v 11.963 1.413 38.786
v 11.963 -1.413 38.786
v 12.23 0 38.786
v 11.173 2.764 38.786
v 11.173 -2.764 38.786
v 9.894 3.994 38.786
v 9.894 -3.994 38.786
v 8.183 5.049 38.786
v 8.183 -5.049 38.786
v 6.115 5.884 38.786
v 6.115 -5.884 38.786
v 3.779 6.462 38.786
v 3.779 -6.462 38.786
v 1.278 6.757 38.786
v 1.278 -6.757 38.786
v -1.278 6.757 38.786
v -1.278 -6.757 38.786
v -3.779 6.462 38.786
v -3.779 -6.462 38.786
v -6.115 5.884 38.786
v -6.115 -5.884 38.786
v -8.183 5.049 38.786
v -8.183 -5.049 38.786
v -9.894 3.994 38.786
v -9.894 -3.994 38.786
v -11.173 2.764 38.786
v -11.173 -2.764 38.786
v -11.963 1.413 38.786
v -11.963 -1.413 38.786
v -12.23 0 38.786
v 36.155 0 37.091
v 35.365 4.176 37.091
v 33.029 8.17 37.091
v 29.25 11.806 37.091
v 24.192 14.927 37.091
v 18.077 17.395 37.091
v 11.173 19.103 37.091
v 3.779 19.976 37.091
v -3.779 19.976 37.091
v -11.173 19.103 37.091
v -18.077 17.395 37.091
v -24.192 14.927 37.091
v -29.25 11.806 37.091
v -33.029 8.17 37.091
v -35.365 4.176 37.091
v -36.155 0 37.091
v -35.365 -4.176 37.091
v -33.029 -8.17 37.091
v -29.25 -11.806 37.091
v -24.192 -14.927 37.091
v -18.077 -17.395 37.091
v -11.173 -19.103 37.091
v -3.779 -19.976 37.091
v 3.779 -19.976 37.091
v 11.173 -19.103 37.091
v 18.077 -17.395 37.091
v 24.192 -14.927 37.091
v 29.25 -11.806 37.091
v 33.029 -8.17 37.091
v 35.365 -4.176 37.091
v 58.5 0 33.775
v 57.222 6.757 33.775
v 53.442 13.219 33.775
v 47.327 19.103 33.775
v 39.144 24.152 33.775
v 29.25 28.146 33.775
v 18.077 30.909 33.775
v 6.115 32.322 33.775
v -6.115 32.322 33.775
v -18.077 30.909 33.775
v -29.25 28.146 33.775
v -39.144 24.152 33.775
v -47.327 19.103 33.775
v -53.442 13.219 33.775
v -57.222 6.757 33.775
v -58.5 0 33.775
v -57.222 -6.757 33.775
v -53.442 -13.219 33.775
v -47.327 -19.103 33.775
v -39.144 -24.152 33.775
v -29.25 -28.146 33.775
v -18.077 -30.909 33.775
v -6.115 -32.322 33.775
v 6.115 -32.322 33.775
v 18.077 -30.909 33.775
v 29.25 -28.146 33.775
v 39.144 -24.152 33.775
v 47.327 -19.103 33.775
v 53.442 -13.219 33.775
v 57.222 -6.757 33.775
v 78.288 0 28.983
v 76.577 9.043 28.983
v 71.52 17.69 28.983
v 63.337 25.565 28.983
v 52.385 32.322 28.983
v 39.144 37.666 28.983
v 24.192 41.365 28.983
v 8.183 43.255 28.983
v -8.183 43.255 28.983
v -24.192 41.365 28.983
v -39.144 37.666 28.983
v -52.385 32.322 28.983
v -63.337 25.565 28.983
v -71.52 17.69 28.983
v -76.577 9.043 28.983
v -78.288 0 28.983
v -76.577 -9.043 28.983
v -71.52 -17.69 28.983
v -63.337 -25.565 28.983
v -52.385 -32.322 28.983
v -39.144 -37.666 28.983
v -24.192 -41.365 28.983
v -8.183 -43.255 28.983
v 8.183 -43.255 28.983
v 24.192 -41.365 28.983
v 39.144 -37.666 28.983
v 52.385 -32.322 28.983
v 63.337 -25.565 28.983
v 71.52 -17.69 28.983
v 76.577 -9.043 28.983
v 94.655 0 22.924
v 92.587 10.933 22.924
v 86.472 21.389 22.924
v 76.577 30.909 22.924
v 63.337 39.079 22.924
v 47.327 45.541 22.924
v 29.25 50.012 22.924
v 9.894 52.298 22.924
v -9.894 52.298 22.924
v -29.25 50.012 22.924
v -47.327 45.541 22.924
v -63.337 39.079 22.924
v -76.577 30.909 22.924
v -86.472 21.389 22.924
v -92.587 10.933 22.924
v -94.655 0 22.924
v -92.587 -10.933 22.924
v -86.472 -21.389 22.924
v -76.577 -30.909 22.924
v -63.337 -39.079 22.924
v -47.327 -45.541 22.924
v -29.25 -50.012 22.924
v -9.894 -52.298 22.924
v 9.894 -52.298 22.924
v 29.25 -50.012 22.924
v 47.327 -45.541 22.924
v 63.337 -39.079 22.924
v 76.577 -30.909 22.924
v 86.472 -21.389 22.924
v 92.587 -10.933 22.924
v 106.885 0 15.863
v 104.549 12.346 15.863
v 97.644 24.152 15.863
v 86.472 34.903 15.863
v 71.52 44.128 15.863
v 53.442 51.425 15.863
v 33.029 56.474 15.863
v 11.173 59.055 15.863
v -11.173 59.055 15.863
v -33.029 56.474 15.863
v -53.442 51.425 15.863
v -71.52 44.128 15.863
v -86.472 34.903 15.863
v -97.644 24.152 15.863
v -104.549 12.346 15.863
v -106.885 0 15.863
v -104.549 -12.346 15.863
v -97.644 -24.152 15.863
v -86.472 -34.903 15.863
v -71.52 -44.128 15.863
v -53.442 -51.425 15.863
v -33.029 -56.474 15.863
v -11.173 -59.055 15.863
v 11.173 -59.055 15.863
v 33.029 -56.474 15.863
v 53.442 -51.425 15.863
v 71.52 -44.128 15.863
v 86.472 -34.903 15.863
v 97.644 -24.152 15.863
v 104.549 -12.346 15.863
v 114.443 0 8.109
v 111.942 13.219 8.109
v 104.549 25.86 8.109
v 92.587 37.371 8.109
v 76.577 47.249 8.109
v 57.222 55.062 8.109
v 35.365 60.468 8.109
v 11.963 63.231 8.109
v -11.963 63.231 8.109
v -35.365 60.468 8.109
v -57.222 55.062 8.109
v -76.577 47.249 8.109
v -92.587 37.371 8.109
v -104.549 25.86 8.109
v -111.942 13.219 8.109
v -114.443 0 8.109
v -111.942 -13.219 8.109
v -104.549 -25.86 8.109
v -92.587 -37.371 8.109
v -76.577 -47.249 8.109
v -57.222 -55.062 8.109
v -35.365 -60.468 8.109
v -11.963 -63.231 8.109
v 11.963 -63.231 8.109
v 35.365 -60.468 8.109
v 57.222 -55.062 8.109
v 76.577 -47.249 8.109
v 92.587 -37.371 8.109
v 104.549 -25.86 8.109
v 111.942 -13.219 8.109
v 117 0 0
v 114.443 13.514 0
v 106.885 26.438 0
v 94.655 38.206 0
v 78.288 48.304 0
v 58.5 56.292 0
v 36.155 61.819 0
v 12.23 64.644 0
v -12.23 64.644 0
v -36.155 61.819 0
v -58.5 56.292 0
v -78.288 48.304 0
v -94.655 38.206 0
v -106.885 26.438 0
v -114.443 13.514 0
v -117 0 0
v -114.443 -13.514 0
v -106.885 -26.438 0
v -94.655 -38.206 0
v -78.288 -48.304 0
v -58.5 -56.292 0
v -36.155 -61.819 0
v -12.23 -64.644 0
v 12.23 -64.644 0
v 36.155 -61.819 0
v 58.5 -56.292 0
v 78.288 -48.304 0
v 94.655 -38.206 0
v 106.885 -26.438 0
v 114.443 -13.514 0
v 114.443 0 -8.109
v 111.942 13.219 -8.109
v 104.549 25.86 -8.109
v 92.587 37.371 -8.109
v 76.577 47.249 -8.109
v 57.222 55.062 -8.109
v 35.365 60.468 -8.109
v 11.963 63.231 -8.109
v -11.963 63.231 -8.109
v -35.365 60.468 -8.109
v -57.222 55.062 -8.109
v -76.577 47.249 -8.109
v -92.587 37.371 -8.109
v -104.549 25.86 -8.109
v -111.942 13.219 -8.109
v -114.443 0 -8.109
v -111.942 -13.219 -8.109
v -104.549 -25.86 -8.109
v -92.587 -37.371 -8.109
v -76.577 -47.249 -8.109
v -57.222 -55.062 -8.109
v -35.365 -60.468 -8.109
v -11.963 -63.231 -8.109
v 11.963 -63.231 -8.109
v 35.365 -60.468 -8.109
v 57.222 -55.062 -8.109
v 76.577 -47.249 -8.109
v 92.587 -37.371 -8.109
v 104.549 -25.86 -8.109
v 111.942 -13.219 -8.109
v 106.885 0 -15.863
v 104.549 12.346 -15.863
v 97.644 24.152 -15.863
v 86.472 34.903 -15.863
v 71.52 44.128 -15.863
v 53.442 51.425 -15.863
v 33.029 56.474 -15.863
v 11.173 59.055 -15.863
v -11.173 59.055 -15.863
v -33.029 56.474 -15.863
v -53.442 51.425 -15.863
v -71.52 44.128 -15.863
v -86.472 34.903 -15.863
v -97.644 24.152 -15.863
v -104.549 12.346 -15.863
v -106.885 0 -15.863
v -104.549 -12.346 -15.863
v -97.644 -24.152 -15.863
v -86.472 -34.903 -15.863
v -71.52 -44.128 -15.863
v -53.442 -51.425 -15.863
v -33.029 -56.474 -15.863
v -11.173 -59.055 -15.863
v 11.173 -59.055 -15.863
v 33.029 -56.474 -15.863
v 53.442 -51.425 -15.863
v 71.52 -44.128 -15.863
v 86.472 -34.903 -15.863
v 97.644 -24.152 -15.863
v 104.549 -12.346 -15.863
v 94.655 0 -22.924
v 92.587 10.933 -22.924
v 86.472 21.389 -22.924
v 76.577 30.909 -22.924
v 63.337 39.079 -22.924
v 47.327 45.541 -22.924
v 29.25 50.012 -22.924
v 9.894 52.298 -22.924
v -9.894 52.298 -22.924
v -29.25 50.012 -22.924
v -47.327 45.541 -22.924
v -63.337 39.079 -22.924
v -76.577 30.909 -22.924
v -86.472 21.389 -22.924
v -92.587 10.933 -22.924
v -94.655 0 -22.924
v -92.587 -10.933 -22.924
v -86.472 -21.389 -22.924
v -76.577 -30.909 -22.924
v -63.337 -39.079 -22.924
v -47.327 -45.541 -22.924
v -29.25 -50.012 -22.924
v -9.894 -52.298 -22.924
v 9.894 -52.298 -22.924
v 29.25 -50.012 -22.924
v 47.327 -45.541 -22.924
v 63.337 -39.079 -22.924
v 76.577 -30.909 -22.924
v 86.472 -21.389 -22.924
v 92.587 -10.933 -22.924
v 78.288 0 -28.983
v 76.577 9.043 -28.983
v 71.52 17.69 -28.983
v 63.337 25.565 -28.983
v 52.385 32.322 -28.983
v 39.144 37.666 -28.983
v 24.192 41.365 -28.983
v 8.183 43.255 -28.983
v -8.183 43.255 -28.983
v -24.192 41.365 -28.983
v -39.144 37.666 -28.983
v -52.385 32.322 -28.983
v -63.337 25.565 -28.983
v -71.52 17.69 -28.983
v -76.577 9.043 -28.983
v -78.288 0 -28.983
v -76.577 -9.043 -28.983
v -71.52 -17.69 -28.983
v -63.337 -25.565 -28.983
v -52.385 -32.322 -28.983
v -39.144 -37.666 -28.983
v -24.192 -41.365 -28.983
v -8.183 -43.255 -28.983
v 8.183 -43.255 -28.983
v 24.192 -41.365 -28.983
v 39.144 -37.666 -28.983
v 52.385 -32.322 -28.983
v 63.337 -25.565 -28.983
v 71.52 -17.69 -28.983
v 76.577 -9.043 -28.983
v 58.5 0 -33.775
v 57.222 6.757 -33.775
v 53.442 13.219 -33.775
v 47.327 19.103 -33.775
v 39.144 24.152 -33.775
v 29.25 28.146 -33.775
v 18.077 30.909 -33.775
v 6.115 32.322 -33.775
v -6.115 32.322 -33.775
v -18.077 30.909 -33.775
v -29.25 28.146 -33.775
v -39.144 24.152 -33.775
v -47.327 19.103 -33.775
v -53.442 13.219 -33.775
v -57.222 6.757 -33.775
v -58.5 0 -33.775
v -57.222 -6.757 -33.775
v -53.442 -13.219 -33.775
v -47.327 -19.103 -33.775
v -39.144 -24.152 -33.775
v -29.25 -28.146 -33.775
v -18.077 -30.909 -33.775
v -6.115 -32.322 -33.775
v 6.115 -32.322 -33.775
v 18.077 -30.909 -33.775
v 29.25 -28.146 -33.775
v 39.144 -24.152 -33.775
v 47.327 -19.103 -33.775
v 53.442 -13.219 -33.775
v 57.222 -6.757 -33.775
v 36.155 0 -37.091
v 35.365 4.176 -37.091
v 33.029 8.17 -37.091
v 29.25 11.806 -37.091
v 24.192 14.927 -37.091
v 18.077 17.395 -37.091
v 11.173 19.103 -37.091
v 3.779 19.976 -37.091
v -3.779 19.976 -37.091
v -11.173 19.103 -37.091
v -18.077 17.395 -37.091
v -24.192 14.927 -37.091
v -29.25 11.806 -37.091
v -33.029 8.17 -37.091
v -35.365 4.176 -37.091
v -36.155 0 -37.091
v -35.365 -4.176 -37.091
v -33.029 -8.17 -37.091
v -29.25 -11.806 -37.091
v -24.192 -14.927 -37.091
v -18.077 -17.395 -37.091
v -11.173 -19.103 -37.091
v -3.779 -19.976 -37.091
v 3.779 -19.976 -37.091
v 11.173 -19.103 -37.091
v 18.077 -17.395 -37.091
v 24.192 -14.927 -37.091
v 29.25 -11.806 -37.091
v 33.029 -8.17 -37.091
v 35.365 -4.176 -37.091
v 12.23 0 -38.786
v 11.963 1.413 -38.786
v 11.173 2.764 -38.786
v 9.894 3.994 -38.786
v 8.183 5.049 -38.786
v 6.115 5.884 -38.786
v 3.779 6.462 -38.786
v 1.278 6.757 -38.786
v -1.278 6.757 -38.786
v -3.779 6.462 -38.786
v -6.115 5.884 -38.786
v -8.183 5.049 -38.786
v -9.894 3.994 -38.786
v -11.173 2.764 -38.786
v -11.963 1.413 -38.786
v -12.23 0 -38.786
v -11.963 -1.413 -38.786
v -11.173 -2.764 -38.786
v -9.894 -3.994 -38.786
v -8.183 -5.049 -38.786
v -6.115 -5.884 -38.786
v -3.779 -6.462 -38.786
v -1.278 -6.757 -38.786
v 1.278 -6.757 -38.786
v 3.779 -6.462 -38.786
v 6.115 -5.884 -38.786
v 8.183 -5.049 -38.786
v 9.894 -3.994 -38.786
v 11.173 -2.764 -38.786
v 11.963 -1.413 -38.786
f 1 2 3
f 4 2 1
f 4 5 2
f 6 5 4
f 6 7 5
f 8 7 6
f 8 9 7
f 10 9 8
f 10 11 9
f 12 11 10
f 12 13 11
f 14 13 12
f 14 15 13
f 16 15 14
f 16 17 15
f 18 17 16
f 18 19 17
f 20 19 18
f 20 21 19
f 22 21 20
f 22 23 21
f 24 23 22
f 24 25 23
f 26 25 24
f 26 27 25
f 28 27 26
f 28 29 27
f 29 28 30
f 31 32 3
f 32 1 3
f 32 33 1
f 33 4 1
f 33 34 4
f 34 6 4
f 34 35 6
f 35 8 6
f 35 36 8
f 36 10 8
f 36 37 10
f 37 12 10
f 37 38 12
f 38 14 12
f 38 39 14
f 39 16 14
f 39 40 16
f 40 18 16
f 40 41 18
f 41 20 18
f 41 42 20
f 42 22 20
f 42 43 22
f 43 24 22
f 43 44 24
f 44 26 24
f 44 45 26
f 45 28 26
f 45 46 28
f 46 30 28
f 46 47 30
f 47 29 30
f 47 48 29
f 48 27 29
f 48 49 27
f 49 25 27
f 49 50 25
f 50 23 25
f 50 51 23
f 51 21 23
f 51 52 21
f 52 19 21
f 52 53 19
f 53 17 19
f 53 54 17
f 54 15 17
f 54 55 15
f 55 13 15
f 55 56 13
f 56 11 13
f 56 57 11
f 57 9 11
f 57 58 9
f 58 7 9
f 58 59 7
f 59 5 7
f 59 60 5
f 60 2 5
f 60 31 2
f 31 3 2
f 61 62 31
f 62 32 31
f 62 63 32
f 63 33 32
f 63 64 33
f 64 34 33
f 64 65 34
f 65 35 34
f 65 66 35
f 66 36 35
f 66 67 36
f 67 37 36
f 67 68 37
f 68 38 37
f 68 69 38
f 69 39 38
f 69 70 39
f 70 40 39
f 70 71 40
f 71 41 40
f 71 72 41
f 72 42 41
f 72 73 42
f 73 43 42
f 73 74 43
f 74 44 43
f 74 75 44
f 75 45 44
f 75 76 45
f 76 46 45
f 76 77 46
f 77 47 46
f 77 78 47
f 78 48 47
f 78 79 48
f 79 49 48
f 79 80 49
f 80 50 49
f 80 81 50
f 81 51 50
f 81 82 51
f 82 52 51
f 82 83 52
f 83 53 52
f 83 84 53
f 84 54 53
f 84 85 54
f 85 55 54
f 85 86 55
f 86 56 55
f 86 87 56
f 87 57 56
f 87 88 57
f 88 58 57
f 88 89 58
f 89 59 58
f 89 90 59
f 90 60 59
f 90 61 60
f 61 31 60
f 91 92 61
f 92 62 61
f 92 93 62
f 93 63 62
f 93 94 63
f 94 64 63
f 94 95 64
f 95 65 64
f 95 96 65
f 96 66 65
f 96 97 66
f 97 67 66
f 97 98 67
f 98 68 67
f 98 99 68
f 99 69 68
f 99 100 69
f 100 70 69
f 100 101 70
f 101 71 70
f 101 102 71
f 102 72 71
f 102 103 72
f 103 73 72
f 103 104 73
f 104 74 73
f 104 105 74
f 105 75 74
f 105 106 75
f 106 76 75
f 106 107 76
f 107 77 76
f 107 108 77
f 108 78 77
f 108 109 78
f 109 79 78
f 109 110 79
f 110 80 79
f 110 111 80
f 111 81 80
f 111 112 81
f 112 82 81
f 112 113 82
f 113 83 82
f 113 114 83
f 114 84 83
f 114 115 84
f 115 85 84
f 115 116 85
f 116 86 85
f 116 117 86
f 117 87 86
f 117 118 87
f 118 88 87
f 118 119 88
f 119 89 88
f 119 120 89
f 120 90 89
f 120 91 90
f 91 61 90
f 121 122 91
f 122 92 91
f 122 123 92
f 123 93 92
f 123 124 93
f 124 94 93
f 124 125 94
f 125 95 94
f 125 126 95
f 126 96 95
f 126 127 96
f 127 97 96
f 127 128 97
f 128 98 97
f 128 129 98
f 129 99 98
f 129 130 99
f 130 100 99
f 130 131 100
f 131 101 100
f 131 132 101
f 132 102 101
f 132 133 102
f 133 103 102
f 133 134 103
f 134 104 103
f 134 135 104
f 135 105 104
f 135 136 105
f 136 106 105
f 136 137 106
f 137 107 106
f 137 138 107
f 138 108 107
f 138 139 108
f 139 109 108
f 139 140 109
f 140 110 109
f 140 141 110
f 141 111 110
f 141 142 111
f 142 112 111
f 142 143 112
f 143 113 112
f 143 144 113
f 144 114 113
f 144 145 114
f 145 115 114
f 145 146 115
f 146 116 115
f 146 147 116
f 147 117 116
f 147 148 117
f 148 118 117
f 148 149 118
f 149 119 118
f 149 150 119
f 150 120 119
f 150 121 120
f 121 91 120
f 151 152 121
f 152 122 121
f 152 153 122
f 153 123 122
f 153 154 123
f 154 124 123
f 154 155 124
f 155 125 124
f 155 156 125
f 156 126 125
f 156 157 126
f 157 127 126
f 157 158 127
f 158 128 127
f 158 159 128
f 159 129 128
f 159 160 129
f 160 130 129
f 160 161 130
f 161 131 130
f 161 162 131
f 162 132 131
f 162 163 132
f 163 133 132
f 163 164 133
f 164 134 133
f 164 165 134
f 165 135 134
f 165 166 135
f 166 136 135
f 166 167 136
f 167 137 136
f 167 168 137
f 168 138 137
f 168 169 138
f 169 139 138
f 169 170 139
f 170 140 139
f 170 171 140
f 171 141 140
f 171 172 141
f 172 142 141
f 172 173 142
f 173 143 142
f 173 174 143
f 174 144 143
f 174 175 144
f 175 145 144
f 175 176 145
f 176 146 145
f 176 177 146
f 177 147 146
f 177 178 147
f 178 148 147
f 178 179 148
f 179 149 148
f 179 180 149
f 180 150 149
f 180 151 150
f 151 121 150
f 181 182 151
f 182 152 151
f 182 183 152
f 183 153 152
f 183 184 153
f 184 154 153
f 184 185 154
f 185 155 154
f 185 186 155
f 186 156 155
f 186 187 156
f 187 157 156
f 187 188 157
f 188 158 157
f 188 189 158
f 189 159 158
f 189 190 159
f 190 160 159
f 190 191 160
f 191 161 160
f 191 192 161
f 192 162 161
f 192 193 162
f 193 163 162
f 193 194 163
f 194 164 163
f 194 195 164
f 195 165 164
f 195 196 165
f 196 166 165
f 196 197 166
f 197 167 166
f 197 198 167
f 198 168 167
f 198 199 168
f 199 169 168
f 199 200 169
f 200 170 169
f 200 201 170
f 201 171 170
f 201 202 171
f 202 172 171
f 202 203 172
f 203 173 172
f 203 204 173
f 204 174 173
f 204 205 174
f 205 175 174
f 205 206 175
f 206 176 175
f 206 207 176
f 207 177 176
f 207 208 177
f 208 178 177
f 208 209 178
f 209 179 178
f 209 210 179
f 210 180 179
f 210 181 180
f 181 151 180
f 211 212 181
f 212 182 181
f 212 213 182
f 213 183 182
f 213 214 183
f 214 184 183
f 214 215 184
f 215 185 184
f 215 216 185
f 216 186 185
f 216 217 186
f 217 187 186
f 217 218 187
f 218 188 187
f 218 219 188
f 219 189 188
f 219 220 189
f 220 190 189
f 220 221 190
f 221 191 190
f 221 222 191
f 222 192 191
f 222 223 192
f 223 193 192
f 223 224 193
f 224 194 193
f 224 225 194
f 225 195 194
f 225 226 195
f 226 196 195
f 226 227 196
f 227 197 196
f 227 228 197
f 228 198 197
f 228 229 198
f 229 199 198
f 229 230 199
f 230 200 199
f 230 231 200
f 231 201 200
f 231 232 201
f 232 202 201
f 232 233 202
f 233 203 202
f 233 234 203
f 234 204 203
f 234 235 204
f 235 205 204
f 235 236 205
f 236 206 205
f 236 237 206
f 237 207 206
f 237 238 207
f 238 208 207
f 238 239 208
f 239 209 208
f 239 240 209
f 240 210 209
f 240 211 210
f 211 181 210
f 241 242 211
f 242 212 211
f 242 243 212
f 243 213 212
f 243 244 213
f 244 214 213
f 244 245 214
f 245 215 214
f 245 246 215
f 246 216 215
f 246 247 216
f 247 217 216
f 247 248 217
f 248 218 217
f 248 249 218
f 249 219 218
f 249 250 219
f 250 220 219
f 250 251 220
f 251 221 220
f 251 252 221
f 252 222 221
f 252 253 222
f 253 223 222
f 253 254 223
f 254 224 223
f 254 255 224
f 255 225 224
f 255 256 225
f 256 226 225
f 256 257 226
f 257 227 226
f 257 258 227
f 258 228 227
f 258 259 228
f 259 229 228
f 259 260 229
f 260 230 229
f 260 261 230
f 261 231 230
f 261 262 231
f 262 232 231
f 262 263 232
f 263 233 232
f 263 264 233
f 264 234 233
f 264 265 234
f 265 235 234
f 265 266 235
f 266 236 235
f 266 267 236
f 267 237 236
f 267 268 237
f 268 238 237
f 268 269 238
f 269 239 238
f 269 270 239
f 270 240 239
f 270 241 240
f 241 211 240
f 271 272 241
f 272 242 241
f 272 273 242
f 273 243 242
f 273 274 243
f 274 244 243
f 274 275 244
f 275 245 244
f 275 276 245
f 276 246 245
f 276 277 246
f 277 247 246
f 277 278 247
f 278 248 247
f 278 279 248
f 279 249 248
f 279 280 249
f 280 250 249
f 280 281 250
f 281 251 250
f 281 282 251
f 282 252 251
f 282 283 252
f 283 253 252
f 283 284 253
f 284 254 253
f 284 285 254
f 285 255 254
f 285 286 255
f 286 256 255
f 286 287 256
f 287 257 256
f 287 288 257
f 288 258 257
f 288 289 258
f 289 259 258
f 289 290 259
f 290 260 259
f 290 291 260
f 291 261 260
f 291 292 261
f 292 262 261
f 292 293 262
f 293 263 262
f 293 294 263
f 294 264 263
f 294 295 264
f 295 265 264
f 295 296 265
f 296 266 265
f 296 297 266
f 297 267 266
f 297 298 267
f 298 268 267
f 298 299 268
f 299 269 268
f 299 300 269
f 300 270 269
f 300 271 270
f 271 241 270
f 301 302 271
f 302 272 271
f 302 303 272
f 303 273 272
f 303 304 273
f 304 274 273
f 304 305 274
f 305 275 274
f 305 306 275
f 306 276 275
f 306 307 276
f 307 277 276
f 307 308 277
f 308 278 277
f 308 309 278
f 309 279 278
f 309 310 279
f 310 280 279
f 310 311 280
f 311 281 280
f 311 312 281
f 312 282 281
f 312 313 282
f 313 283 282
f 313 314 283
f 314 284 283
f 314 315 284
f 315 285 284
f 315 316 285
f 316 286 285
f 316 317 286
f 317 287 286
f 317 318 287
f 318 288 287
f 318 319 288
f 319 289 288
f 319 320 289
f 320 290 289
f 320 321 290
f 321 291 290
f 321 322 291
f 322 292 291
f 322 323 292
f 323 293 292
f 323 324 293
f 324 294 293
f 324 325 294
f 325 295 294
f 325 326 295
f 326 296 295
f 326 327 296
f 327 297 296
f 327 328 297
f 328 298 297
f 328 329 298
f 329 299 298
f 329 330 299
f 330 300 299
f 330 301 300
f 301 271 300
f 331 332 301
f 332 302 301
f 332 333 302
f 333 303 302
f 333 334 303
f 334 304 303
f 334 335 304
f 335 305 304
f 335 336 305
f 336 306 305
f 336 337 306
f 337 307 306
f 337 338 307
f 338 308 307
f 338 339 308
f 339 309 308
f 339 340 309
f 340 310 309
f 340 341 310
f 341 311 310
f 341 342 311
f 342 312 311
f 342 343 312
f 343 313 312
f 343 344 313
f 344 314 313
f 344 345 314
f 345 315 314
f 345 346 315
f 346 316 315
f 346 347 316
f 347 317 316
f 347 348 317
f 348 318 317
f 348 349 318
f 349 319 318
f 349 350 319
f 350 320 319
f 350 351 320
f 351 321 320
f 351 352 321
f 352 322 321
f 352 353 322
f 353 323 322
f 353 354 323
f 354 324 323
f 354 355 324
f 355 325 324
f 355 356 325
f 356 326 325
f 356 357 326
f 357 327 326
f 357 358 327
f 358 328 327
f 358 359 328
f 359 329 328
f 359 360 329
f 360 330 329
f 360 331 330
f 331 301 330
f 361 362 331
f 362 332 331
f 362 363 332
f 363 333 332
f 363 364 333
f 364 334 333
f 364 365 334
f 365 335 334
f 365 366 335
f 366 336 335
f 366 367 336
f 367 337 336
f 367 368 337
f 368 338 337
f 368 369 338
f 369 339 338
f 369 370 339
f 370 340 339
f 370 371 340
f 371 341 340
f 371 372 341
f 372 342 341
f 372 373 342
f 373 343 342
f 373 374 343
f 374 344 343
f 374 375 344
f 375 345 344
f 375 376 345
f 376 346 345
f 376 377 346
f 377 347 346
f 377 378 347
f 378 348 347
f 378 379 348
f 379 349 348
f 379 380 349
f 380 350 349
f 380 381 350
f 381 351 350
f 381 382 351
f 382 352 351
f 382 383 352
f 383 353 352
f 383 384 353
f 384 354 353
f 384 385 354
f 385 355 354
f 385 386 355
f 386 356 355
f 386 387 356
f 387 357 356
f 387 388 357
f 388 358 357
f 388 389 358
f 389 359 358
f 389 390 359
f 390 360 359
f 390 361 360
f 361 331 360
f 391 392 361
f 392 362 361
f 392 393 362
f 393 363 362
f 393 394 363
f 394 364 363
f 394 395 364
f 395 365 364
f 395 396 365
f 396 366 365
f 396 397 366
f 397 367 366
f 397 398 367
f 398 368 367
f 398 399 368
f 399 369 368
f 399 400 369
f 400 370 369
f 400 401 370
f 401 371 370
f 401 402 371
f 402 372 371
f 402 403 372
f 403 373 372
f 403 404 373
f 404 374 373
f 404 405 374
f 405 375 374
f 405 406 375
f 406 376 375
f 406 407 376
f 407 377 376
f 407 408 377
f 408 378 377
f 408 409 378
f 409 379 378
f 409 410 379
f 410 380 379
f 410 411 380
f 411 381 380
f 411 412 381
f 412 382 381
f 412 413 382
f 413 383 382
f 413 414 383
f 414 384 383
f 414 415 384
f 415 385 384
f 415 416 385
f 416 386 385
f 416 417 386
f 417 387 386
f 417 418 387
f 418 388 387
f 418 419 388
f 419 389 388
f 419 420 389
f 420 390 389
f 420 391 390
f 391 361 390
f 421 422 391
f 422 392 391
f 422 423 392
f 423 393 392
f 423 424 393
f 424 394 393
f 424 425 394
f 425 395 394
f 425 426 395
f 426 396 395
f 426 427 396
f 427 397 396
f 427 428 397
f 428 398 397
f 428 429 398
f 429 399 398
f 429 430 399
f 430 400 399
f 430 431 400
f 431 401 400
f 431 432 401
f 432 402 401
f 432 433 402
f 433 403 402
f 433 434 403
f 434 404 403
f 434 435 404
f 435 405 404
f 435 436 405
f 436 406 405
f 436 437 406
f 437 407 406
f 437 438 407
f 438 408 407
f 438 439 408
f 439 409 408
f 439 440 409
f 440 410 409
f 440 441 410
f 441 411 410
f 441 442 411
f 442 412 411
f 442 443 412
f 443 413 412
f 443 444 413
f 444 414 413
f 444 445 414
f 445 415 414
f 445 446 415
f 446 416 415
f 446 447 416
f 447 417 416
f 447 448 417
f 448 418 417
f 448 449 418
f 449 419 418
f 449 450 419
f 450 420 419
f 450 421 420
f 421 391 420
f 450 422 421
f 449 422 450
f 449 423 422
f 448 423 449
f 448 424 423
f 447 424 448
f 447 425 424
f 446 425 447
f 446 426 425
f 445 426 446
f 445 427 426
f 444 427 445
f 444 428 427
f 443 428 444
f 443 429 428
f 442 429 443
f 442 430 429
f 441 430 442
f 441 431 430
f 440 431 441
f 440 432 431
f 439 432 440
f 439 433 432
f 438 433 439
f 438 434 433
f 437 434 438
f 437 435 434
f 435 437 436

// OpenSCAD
// Generated by SolidPython 1.0.1 on 2020-07-29 00:46:48


scale(v = [9, 5, 3]) {
	sphere(r = 13);
}
/***********************************************
*********      SolidPython code:      **********
************************************************
 
# import packages: SolidPython
from solid import *
from solid.utils import *
from itertools import chain, combinations, permutations


class Resize:

    def __init__(self, scad_file):
        self.scad_file = scad_file
        #self.scad_file = import_scad(scad_file)
        # cone/cylinder param:
        self.r1 = 0
        self.r2 = 0
        self.h = 0
        # rectangular prism param:
        self.w = 0
        self.l = 0
        # ellipse param:
        self.r = 0

    # import OpenScad code (file name corresponds to shape)


    # classify shape + parameters
    def assign(self, param1, param2, param3):
        if self.scad_file == 'cone.scad':
            self.r1 = param1
            self.r2 = param2
            self.h = param3
        elif self.scad_file == 'cylinder.scad':
            self.r1 = param1
            self.r2 = param2
            self.h = param3
        elif self.scad_file == 'rectangularPrism.scad':
            self.h = param1
            self.l = param2
            self.w = param3
        else:
            self.r = param1
            self.h = param2

    # resize parameters
    def iterate(self):
        x = range(3, 20, 2)
        i = 1
        if self.scad_file == 'cone.scad':
            tempList = list(permutations(x, 2))
            for temp in tempList:
                param1 = temp[0]
                param2 = temp[1]
                filepath = 'produced_scad_files/' + 'cone' + str(param1) + '_' + str(param2) + '_' + '.scad'
                scad_render_to_file(cylinder(h=param1, r1=param2, r2=0), filepath)

        elif self.scad_file == 'cylinder.scad':
            tempList = list(permutations(x, 3))
            for temp in tempList:
                param1 = temp[0]
                param2 = temp[1]
                filepath = 'produced_scad_files/' + 'cylinder' + str(param1) + '_' + str(param2) + '_' + '.scad'
                scad_render_to_file(cylinder(h=param1, r1=param2, r2=param2), filepath)

        elif self.scad_file == 'rectangularPrism.scad':
            tempList = list(permutations(x, 3))
            for temp in tempList:
                param1 = temp[0]
                param2 = temp[1]
                param3 = temp[2]
                filepath = 'produced_scad_files/' + 'rectangularPrism' + str(param1) + '_' + str(param2) + '_' + str(
                    param3) + '.scad'
                scad_render_to_file(cube(size=(param1, param2, param3)), filepath)

        elif self.scad_file == 'ellipse.scad':
            tempList = list(permutations(x, 4))
            for temp in tempList:
                param1 = temp[0]
                param2 = temp[1]
                param3 = temp[2]
                param4 = temp[3]
                filepath = 'produced_scad_files/' + 'ellipse' + str(param1) + '_' + str(param2) + '_' + str(param3) + '_' + str(param4) + '.scad'
                scad_render_to_file(scale([param1, param2, param3])(sphere(r=param4)), filepath)

    def render_to_scadfile(self):
        scad_render_to_file(scad, 'example.scad') 
 
************************************************/
